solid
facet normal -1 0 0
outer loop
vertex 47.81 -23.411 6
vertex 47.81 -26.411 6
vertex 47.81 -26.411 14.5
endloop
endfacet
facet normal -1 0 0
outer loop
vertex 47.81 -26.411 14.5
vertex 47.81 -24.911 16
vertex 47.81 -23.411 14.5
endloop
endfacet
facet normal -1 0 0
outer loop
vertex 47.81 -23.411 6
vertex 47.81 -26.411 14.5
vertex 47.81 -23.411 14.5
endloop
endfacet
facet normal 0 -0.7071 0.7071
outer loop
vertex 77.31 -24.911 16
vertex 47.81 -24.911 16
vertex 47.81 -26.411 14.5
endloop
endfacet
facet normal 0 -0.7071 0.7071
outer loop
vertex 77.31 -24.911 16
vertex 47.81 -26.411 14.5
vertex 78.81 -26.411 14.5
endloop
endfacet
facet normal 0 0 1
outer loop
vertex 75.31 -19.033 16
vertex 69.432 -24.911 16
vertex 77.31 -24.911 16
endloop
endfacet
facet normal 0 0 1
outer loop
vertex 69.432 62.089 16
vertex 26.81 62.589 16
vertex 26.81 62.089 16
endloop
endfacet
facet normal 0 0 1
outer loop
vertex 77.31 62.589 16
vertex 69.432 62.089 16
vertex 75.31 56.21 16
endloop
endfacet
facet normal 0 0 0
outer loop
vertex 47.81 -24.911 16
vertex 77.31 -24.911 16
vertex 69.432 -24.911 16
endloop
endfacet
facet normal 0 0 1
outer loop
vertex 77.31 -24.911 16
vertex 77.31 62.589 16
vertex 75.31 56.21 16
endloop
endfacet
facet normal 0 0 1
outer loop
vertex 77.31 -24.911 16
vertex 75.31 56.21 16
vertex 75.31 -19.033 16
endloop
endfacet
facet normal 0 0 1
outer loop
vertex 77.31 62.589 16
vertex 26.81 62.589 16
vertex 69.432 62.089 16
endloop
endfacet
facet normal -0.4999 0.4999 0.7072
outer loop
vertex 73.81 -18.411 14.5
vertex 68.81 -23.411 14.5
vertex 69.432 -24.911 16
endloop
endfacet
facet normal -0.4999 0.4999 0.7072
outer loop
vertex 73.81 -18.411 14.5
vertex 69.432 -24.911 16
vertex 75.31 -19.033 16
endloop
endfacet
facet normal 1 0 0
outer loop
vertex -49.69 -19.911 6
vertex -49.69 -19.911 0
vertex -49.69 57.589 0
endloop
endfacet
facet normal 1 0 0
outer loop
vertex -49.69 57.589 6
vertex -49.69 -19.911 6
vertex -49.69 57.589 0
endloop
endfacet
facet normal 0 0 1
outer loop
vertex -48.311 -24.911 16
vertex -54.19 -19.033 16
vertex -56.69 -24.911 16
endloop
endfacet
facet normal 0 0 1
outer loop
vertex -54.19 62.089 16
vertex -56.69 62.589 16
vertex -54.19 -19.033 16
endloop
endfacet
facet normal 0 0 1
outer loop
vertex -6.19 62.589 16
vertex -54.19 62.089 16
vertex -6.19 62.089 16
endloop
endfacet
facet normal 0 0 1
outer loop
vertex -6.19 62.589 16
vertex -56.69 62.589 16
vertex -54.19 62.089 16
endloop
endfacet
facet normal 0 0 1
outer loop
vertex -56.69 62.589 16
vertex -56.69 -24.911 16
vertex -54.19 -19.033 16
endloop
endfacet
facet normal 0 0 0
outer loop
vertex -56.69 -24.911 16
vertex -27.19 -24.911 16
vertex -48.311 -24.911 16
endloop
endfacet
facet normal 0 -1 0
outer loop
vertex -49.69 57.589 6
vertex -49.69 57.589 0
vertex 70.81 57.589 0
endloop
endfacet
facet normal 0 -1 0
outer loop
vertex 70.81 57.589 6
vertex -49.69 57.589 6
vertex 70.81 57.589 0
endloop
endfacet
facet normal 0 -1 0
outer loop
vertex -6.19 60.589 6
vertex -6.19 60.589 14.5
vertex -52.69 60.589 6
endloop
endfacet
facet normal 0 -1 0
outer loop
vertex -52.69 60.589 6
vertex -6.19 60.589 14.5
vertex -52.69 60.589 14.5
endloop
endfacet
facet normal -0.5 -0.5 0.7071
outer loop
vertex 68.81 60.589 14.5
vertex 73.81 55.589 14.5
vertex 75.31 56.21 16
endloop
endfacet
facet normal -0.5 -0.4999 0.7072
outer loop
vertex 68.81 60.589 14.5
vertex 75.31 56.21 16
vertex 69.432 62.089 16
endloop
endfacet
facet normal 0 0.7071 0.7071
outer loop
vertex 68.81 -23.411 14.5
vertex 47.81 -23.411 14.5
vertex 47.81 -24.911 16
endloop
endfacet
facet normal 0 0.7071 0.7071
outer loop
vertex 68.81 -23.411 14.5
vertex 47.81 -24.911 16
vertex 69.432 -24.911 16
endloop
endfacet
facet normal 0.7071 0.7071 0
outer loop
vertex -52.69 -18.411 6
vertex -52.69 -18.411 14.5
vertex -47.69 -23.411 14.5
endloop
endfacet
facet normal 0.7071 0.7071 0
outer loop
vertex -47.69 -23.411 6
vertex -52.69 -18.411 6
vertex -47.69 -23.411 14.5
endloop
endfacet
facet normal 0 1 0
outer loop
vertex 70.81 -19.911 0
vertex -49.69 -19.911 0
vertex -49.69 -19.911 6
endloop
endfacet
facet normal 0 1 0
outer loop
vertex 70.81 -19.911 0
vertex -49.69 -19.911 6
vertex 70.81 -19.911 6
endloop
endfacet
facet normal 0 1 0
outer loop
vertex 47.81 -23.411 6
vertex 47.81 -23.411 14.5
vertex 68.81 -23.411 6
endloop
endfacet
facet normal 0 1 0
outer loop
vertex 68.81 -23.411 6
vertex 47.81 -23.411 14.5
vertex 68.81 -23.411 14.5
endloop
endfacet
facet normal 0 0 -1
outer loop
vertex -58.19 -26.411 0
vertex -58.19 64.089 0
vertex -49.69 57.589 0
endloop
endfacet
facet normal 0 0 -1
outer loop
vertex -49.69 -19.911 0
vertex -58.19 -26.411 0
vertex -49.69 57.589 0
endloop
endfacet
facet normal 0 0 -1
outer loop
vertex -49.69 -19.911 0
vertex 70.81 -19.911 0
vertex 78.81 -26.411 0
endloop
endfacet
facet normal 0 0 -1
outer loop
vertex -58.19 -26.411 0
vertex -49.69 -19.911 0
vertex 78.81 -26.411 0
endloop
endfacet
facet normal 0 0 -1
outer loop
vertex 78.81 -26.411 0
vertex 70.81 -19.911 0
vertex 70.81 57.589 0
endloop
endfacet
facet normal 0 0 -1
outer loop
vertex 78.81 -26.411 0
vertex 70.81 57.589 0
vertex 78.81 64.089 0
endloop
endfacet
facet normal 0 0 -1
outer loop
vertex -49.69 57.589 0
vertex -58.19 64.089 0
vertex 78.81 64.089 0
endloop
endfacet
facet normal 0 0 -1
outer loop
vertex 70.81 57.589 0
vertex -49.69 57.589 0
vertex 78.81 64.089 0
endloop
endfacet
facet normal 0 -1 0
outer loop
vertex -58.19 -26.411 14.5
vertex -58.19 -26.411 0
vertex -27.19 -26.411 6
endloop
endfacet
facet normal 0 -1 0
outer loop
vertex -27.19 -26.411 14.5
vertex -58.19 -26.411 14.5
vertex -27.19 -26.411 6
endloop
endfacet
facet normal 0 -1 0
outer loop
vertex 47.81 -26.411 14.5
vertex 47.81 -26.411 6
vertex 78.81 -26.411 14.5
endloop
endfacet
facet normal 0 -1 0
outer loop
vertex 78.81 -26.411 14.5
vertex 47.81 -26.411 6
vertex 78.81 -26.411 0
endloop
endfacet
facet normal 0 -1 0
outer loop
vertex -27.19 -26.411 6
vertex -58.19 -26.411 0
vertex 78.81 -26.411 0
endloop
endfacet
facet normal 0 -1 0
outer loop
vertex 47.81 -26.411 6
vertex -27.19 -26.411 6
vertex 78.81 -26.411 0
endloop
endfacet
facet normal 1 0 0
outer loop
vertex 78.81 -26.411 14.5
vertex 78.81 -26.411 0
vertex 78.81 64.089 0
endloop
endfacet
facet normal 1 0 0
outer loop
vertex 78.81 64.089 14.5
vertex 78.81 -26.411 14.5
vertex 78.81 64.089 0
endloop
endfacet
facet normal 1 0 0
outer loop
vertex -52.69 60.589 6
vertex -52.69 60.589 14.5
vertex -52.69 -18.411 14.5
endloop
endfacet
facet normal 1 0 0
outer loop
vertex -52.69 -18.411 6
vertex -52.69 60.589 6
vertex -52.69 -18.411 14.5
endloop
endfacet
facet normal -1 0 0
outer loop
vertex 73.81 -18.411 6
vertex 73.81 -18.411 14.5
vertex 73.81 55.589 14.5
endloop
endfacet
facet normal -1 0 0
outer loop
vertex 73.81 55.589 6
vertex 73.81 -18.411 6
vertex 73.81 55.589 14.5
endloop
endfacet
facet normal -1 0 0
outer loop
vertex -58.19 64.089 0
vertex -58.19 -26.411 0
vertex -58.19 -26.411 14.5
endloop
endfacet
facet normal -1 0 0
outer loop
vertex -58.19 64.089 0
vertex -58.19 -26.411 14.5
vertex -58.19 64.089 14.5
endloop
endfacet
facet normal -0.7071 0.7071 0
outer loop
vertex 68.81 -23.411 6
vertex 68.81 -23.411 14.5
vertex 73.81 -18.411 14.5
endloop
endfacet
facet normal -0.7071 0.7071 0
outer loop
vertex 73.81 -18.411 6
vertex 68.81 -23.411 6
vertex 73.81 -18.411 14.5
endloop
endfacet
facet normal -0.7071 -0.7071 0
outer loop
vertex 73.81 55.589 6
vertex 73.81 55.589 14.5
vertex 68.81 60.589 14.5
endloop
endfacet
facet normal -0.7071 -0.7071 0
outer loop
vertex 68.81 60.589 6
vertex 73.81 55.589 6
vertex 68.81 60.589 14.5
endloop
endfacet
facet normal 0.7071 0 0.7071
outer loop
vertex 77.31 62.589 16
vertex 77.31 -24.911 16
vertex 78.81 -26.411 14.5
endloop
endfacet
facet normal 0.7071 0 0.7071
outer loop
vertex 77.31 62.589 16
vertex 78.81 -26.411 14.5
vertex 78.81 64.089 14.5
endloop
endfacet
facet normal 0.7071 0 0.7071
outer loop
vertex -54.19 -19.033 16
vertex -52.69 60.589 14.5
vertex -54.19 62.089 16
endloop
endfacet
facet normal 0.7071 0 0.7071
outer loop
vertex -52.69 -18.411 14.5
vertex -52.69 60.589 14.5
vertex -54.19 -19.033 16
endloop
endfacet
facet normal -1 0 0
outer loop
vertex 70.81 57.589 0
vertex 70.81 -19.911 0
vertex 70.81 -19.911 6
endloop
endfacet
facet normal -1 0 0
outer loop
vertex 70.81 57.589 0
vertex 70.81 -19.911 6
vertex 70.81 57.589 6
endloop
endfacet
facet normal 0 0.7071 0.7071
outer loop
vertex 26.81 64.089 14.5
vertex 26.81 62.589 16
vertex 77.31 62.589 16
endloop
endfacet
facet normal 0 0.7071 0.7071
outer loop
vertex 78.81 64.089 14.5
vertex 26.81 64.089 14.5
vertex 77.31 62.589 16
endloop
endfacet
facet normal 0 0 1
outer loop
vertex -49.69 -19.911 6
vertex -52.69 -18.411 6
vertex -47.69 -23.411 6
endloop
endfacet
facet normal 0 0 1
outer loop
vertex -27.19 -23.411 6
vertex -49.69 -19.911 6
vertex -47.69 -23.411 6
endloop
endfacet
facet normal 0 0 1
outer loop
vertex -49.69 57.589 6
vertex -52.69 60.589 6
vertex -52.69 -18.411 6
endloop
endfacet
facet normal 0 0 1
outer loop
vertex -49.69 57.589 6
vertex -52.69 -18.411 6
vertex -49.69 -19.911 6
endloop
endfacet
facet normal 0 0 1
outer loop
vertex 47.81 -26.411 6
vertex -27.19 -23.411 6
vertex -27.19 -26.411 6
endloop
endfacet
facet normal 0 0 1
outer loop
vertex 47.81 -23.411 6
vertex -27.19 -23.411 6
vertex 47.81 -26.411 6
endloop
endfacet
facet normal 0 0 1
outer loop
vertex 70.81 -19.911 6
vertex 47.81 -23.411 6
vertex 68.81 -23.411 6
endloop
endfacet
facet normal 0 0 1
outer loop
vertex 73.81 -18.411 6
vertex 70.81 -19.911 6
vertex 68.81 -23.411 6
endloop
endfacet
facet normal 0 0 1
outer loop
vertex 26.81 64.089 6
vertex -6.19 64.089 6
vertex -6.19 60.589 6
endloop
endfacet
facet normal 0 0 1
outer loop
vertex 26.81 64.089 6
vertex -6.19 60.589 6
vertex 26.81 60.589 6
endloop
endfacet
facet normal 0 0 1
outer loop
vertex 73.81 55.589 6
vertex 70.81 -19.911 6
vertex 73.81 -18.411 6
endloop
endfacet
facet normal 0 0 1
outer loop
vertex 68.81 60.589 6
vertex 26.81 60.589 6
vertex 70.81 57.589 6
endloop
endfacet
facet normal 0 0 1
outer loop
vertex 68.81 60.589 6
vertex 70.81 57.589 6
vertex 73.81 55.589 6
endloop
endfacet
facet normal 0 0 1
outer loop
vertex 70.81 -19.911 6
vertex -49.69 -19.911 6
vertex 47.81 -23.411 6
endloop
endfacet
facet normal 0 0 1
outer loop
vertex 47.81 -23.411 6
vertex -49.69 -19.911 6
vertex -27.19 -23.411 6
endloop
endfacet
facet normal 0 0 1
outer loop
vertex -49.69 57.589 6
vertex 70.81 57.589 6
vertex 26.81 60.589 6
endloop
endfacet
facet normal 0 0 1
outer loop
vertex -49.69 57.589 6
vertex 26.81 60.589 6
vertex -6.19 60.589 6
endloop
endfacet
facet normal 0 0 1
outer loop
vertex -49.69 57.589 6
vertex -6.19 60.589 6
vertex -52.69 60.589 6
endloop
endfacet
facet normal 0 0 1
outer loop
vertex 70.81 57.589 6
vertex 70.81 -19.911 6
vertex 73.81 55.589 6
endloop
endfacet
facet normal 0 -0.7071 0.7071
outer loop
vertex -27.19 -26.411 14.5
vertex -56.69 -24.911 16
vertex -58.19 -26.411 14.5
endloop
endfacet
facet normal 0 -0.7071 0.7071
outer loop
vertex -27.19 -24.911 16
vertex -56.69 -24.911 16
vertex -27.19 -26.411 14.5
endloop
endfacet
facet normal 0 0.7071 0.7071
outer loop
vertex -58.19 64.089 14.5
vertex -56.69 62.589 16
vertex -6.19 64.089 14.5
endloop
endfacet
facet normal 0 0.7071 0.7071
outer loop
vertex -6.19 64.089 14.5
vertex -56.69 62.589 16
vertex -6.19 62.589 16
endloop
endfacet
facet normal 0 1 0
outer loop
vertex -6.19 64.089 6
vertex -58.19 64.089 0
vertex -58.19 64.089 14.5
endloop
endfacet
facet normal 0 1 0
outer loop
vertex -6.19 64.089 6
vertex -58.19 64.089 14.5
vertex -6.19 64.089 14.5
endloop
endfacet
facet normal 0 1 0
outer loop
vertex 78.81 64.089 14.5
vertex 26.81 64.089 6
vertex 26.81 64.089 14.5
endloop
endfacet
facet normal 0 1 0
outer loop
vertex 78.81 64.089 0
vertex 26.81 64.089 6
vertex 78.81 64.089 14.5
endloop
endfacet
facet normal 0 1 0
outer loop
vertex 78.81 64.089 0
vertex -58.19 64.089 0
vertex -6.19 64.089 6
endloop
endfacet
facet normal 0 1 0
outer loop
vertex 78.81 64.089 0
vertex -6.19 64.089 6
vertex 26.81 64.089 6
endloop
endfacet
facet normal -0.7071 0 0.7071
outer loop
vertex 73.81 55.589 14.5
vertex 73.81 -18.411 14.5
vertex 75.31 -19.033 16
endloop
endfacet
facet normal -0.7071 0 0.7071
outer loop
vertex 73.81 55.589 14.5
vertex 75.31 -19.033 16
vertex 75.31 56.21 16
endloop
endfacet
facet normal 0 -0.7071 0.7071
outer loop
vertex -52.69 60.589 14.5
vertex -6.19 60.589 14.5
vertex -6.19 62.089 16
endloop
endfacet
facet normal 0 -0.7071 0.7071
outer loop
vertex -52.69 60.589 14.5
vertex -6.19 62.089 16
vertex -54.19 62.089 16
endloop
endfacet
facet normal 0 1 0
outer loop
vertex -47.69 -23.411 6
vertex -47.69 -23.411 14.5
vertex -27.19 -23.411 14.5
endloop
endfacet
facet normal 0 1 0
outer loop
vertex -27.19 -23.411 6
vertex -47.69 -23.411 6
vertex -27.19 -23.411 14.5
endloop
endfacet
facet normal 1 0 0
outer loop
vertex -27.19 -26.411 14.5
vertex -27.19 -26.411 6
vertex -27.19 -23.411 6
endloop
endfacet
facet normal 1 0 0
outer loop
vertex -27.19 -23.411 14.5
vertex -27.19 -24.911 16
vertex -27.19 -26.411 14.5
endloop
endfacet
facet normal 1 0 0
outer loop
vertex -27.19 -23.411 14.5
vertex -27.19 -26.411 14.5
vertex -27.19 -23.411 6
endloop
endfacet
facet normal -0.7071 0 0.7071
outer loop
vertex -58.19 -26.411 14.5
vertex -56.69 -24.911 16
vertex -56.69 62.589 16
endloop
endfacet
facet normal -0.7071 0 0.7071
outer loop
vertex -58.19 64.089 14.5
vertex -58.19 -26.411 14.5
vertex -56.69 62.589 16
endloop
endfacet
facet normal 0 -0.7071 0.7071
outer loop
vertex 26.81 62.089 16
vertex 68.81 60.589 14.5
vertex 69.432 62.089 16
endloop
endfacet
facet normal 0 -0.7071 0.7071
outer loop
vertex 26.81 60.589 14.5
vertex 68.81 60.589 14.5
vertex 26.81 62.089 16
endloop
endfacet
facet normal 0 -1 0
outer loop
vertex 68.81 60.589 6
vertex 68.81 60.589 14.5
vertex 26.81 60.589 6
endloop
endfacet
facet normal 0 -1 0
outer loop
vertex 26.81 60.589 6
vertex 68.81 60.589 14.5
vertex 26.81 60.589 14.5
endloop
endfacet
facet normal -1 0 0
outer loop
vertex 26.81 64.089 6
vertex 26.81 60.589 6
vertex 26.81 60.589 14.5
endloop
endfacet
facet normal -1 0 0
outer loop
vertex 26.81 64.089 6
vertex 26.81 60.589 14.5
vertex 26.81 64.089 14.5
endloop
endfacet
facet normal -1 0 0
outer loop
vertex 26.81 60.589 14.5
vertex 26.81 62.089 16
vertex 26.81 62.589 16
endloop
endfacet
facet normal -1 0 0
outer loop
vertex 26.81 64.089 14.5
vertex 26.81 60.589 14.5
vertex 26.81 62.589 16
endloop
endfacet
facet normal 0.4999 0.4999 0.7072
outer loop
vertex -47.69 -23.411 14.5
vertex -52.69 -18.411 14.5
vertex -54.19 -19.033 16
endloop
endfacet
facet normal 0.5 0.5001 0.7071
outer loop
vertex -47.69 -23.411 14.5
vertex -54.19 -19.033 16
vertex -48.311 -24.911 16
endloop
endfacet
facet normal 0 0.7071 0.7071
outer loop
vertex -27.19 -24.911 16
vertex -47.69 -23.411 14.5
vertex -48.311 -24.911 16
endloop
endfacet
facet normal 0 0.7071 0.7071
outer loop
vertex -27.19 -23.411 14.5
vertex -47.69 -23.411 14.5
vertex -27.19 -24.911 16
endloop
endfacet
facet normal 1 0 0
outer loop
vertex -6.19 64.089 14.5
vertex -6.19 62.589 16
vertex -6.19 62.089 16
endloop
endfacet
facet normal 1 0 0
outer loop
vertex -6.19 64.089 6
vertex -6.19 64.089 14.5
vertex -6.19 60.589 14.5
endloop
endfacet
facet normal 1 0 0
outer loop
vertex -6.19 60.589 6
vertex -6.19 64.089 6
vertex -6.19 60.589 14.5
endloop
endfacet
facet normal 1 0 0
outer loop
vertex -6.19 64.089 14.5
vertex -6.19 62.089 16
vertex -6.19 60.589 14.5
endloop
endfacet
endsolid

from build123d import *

# Parameters (mm, degrees)
F0_W     = 137
F0_H     = 90.5
F0_W_2   = 120.5
F0_H_2   = 77.5
F1_DEPTH = 16
F3_W     = 33
F3_H     = 20.2931881964
F3_H_2   = 28.397909285
F3_W_2   = 75
F3_H_3   = 9.5986060599
F3_H_4   = 10.4013939401
F4_DEPTH = 10
F5_SIZE  = 1.49999


# Not quite as in the source:
# - a fillet or chamfer is up to 0.001 mm smaller than in the source, because OpenCascade refuses the exact size
# - a feature names something its author has since deleted; it is built from what else it names


with BuildPart() as f1:
    # F0 (on Top) → F1 (new body)
    with BuildSketch(Plane.XY):
        with Locations((10.3103105978, 18.8386597227)):
            Rectangle(F0_W, F0_H)
        with Locations((10.5603105978, 18.8386597227)):
            Rectangle(F0_W_2, F0_H_2, mode=Mode.SUBTRACT)
    extrude(amount=F1_DEPTH)

    # F3 (on 3pt) → F4 (cut)
    with BuildSketch(Plane.XY.offset(16)):
        with Locations((10.3103105978, 70.7352538208)):
            Rectangle(F3_W, F3_H)
        with Locations((10.3103105978, 46.3897050802)):
            Rectangle(F3_W, F3_H_2)
        Polygon((-6.1896894022, 32.1907504376), (-6.1896894022, 60.5886597227), (-52.6896894022, 60.5886597227), (-52.6896894022, -18.4113402773), (-47.6896894022, -23.4113402773), (-27.1896894022, -23.4113402773), (-27.1896894022, -13.8127342174), (47.8103105978, -13.8127342174), (47.8103105978, -23.4113402773), (68.8103105978, -23.4113402773), (73.8103105978, -18.4113402773), (73.8103105978, 55.5886597227), (68.8103105978, 60.5886597227), (26.8103105978, 60.5886597227), (26.8103105978, 32.1907504376), align=None)
        with Locations((10.3103105978, -18.6120372474)):
            Rectangle(F3_W_2, F3_H_3)
        with Locations((10.3103105978, -28.6120372474)):
            Rectangle(F3_W_2, F3_H_4)
    extrude(amount=-F4_DEPTH, mode=Mode.SUBTRACT)

    # F5 (size 1.5 in the source; OpenCascade refuses exactly that, so slightly less here)
    f5_edges = [f1.edges().sort_by_distance(p)[0] for p in [
        (-52.689689, 21.08866, 16),
        (-29.439689, 60.58866, 16),
        (78.810311, 18.83866, 16),
        (63.310311, -26.41134, 16),
        (52.810311, 64.08866, 16),
        (-32.189689, 64.08866, 16),
        (-58.189689, 18.83866, 16),
        (-42.689689, -26.41134, 16),
        (71.310311, 58.08866, 16),
        (73.810311, 18.58866, 16),
        (71.310311, -20.91134, 16),
        (-50.189689, -20.91134, 16),
        (58.310311, -23.41134, 16),
        (47.810311, 60.58866, 16),
        (-37.439689, -23.41134, 16),
    ]]
    chamfer(f5_edges, length=F5_SIZE)


solid = f1.part
